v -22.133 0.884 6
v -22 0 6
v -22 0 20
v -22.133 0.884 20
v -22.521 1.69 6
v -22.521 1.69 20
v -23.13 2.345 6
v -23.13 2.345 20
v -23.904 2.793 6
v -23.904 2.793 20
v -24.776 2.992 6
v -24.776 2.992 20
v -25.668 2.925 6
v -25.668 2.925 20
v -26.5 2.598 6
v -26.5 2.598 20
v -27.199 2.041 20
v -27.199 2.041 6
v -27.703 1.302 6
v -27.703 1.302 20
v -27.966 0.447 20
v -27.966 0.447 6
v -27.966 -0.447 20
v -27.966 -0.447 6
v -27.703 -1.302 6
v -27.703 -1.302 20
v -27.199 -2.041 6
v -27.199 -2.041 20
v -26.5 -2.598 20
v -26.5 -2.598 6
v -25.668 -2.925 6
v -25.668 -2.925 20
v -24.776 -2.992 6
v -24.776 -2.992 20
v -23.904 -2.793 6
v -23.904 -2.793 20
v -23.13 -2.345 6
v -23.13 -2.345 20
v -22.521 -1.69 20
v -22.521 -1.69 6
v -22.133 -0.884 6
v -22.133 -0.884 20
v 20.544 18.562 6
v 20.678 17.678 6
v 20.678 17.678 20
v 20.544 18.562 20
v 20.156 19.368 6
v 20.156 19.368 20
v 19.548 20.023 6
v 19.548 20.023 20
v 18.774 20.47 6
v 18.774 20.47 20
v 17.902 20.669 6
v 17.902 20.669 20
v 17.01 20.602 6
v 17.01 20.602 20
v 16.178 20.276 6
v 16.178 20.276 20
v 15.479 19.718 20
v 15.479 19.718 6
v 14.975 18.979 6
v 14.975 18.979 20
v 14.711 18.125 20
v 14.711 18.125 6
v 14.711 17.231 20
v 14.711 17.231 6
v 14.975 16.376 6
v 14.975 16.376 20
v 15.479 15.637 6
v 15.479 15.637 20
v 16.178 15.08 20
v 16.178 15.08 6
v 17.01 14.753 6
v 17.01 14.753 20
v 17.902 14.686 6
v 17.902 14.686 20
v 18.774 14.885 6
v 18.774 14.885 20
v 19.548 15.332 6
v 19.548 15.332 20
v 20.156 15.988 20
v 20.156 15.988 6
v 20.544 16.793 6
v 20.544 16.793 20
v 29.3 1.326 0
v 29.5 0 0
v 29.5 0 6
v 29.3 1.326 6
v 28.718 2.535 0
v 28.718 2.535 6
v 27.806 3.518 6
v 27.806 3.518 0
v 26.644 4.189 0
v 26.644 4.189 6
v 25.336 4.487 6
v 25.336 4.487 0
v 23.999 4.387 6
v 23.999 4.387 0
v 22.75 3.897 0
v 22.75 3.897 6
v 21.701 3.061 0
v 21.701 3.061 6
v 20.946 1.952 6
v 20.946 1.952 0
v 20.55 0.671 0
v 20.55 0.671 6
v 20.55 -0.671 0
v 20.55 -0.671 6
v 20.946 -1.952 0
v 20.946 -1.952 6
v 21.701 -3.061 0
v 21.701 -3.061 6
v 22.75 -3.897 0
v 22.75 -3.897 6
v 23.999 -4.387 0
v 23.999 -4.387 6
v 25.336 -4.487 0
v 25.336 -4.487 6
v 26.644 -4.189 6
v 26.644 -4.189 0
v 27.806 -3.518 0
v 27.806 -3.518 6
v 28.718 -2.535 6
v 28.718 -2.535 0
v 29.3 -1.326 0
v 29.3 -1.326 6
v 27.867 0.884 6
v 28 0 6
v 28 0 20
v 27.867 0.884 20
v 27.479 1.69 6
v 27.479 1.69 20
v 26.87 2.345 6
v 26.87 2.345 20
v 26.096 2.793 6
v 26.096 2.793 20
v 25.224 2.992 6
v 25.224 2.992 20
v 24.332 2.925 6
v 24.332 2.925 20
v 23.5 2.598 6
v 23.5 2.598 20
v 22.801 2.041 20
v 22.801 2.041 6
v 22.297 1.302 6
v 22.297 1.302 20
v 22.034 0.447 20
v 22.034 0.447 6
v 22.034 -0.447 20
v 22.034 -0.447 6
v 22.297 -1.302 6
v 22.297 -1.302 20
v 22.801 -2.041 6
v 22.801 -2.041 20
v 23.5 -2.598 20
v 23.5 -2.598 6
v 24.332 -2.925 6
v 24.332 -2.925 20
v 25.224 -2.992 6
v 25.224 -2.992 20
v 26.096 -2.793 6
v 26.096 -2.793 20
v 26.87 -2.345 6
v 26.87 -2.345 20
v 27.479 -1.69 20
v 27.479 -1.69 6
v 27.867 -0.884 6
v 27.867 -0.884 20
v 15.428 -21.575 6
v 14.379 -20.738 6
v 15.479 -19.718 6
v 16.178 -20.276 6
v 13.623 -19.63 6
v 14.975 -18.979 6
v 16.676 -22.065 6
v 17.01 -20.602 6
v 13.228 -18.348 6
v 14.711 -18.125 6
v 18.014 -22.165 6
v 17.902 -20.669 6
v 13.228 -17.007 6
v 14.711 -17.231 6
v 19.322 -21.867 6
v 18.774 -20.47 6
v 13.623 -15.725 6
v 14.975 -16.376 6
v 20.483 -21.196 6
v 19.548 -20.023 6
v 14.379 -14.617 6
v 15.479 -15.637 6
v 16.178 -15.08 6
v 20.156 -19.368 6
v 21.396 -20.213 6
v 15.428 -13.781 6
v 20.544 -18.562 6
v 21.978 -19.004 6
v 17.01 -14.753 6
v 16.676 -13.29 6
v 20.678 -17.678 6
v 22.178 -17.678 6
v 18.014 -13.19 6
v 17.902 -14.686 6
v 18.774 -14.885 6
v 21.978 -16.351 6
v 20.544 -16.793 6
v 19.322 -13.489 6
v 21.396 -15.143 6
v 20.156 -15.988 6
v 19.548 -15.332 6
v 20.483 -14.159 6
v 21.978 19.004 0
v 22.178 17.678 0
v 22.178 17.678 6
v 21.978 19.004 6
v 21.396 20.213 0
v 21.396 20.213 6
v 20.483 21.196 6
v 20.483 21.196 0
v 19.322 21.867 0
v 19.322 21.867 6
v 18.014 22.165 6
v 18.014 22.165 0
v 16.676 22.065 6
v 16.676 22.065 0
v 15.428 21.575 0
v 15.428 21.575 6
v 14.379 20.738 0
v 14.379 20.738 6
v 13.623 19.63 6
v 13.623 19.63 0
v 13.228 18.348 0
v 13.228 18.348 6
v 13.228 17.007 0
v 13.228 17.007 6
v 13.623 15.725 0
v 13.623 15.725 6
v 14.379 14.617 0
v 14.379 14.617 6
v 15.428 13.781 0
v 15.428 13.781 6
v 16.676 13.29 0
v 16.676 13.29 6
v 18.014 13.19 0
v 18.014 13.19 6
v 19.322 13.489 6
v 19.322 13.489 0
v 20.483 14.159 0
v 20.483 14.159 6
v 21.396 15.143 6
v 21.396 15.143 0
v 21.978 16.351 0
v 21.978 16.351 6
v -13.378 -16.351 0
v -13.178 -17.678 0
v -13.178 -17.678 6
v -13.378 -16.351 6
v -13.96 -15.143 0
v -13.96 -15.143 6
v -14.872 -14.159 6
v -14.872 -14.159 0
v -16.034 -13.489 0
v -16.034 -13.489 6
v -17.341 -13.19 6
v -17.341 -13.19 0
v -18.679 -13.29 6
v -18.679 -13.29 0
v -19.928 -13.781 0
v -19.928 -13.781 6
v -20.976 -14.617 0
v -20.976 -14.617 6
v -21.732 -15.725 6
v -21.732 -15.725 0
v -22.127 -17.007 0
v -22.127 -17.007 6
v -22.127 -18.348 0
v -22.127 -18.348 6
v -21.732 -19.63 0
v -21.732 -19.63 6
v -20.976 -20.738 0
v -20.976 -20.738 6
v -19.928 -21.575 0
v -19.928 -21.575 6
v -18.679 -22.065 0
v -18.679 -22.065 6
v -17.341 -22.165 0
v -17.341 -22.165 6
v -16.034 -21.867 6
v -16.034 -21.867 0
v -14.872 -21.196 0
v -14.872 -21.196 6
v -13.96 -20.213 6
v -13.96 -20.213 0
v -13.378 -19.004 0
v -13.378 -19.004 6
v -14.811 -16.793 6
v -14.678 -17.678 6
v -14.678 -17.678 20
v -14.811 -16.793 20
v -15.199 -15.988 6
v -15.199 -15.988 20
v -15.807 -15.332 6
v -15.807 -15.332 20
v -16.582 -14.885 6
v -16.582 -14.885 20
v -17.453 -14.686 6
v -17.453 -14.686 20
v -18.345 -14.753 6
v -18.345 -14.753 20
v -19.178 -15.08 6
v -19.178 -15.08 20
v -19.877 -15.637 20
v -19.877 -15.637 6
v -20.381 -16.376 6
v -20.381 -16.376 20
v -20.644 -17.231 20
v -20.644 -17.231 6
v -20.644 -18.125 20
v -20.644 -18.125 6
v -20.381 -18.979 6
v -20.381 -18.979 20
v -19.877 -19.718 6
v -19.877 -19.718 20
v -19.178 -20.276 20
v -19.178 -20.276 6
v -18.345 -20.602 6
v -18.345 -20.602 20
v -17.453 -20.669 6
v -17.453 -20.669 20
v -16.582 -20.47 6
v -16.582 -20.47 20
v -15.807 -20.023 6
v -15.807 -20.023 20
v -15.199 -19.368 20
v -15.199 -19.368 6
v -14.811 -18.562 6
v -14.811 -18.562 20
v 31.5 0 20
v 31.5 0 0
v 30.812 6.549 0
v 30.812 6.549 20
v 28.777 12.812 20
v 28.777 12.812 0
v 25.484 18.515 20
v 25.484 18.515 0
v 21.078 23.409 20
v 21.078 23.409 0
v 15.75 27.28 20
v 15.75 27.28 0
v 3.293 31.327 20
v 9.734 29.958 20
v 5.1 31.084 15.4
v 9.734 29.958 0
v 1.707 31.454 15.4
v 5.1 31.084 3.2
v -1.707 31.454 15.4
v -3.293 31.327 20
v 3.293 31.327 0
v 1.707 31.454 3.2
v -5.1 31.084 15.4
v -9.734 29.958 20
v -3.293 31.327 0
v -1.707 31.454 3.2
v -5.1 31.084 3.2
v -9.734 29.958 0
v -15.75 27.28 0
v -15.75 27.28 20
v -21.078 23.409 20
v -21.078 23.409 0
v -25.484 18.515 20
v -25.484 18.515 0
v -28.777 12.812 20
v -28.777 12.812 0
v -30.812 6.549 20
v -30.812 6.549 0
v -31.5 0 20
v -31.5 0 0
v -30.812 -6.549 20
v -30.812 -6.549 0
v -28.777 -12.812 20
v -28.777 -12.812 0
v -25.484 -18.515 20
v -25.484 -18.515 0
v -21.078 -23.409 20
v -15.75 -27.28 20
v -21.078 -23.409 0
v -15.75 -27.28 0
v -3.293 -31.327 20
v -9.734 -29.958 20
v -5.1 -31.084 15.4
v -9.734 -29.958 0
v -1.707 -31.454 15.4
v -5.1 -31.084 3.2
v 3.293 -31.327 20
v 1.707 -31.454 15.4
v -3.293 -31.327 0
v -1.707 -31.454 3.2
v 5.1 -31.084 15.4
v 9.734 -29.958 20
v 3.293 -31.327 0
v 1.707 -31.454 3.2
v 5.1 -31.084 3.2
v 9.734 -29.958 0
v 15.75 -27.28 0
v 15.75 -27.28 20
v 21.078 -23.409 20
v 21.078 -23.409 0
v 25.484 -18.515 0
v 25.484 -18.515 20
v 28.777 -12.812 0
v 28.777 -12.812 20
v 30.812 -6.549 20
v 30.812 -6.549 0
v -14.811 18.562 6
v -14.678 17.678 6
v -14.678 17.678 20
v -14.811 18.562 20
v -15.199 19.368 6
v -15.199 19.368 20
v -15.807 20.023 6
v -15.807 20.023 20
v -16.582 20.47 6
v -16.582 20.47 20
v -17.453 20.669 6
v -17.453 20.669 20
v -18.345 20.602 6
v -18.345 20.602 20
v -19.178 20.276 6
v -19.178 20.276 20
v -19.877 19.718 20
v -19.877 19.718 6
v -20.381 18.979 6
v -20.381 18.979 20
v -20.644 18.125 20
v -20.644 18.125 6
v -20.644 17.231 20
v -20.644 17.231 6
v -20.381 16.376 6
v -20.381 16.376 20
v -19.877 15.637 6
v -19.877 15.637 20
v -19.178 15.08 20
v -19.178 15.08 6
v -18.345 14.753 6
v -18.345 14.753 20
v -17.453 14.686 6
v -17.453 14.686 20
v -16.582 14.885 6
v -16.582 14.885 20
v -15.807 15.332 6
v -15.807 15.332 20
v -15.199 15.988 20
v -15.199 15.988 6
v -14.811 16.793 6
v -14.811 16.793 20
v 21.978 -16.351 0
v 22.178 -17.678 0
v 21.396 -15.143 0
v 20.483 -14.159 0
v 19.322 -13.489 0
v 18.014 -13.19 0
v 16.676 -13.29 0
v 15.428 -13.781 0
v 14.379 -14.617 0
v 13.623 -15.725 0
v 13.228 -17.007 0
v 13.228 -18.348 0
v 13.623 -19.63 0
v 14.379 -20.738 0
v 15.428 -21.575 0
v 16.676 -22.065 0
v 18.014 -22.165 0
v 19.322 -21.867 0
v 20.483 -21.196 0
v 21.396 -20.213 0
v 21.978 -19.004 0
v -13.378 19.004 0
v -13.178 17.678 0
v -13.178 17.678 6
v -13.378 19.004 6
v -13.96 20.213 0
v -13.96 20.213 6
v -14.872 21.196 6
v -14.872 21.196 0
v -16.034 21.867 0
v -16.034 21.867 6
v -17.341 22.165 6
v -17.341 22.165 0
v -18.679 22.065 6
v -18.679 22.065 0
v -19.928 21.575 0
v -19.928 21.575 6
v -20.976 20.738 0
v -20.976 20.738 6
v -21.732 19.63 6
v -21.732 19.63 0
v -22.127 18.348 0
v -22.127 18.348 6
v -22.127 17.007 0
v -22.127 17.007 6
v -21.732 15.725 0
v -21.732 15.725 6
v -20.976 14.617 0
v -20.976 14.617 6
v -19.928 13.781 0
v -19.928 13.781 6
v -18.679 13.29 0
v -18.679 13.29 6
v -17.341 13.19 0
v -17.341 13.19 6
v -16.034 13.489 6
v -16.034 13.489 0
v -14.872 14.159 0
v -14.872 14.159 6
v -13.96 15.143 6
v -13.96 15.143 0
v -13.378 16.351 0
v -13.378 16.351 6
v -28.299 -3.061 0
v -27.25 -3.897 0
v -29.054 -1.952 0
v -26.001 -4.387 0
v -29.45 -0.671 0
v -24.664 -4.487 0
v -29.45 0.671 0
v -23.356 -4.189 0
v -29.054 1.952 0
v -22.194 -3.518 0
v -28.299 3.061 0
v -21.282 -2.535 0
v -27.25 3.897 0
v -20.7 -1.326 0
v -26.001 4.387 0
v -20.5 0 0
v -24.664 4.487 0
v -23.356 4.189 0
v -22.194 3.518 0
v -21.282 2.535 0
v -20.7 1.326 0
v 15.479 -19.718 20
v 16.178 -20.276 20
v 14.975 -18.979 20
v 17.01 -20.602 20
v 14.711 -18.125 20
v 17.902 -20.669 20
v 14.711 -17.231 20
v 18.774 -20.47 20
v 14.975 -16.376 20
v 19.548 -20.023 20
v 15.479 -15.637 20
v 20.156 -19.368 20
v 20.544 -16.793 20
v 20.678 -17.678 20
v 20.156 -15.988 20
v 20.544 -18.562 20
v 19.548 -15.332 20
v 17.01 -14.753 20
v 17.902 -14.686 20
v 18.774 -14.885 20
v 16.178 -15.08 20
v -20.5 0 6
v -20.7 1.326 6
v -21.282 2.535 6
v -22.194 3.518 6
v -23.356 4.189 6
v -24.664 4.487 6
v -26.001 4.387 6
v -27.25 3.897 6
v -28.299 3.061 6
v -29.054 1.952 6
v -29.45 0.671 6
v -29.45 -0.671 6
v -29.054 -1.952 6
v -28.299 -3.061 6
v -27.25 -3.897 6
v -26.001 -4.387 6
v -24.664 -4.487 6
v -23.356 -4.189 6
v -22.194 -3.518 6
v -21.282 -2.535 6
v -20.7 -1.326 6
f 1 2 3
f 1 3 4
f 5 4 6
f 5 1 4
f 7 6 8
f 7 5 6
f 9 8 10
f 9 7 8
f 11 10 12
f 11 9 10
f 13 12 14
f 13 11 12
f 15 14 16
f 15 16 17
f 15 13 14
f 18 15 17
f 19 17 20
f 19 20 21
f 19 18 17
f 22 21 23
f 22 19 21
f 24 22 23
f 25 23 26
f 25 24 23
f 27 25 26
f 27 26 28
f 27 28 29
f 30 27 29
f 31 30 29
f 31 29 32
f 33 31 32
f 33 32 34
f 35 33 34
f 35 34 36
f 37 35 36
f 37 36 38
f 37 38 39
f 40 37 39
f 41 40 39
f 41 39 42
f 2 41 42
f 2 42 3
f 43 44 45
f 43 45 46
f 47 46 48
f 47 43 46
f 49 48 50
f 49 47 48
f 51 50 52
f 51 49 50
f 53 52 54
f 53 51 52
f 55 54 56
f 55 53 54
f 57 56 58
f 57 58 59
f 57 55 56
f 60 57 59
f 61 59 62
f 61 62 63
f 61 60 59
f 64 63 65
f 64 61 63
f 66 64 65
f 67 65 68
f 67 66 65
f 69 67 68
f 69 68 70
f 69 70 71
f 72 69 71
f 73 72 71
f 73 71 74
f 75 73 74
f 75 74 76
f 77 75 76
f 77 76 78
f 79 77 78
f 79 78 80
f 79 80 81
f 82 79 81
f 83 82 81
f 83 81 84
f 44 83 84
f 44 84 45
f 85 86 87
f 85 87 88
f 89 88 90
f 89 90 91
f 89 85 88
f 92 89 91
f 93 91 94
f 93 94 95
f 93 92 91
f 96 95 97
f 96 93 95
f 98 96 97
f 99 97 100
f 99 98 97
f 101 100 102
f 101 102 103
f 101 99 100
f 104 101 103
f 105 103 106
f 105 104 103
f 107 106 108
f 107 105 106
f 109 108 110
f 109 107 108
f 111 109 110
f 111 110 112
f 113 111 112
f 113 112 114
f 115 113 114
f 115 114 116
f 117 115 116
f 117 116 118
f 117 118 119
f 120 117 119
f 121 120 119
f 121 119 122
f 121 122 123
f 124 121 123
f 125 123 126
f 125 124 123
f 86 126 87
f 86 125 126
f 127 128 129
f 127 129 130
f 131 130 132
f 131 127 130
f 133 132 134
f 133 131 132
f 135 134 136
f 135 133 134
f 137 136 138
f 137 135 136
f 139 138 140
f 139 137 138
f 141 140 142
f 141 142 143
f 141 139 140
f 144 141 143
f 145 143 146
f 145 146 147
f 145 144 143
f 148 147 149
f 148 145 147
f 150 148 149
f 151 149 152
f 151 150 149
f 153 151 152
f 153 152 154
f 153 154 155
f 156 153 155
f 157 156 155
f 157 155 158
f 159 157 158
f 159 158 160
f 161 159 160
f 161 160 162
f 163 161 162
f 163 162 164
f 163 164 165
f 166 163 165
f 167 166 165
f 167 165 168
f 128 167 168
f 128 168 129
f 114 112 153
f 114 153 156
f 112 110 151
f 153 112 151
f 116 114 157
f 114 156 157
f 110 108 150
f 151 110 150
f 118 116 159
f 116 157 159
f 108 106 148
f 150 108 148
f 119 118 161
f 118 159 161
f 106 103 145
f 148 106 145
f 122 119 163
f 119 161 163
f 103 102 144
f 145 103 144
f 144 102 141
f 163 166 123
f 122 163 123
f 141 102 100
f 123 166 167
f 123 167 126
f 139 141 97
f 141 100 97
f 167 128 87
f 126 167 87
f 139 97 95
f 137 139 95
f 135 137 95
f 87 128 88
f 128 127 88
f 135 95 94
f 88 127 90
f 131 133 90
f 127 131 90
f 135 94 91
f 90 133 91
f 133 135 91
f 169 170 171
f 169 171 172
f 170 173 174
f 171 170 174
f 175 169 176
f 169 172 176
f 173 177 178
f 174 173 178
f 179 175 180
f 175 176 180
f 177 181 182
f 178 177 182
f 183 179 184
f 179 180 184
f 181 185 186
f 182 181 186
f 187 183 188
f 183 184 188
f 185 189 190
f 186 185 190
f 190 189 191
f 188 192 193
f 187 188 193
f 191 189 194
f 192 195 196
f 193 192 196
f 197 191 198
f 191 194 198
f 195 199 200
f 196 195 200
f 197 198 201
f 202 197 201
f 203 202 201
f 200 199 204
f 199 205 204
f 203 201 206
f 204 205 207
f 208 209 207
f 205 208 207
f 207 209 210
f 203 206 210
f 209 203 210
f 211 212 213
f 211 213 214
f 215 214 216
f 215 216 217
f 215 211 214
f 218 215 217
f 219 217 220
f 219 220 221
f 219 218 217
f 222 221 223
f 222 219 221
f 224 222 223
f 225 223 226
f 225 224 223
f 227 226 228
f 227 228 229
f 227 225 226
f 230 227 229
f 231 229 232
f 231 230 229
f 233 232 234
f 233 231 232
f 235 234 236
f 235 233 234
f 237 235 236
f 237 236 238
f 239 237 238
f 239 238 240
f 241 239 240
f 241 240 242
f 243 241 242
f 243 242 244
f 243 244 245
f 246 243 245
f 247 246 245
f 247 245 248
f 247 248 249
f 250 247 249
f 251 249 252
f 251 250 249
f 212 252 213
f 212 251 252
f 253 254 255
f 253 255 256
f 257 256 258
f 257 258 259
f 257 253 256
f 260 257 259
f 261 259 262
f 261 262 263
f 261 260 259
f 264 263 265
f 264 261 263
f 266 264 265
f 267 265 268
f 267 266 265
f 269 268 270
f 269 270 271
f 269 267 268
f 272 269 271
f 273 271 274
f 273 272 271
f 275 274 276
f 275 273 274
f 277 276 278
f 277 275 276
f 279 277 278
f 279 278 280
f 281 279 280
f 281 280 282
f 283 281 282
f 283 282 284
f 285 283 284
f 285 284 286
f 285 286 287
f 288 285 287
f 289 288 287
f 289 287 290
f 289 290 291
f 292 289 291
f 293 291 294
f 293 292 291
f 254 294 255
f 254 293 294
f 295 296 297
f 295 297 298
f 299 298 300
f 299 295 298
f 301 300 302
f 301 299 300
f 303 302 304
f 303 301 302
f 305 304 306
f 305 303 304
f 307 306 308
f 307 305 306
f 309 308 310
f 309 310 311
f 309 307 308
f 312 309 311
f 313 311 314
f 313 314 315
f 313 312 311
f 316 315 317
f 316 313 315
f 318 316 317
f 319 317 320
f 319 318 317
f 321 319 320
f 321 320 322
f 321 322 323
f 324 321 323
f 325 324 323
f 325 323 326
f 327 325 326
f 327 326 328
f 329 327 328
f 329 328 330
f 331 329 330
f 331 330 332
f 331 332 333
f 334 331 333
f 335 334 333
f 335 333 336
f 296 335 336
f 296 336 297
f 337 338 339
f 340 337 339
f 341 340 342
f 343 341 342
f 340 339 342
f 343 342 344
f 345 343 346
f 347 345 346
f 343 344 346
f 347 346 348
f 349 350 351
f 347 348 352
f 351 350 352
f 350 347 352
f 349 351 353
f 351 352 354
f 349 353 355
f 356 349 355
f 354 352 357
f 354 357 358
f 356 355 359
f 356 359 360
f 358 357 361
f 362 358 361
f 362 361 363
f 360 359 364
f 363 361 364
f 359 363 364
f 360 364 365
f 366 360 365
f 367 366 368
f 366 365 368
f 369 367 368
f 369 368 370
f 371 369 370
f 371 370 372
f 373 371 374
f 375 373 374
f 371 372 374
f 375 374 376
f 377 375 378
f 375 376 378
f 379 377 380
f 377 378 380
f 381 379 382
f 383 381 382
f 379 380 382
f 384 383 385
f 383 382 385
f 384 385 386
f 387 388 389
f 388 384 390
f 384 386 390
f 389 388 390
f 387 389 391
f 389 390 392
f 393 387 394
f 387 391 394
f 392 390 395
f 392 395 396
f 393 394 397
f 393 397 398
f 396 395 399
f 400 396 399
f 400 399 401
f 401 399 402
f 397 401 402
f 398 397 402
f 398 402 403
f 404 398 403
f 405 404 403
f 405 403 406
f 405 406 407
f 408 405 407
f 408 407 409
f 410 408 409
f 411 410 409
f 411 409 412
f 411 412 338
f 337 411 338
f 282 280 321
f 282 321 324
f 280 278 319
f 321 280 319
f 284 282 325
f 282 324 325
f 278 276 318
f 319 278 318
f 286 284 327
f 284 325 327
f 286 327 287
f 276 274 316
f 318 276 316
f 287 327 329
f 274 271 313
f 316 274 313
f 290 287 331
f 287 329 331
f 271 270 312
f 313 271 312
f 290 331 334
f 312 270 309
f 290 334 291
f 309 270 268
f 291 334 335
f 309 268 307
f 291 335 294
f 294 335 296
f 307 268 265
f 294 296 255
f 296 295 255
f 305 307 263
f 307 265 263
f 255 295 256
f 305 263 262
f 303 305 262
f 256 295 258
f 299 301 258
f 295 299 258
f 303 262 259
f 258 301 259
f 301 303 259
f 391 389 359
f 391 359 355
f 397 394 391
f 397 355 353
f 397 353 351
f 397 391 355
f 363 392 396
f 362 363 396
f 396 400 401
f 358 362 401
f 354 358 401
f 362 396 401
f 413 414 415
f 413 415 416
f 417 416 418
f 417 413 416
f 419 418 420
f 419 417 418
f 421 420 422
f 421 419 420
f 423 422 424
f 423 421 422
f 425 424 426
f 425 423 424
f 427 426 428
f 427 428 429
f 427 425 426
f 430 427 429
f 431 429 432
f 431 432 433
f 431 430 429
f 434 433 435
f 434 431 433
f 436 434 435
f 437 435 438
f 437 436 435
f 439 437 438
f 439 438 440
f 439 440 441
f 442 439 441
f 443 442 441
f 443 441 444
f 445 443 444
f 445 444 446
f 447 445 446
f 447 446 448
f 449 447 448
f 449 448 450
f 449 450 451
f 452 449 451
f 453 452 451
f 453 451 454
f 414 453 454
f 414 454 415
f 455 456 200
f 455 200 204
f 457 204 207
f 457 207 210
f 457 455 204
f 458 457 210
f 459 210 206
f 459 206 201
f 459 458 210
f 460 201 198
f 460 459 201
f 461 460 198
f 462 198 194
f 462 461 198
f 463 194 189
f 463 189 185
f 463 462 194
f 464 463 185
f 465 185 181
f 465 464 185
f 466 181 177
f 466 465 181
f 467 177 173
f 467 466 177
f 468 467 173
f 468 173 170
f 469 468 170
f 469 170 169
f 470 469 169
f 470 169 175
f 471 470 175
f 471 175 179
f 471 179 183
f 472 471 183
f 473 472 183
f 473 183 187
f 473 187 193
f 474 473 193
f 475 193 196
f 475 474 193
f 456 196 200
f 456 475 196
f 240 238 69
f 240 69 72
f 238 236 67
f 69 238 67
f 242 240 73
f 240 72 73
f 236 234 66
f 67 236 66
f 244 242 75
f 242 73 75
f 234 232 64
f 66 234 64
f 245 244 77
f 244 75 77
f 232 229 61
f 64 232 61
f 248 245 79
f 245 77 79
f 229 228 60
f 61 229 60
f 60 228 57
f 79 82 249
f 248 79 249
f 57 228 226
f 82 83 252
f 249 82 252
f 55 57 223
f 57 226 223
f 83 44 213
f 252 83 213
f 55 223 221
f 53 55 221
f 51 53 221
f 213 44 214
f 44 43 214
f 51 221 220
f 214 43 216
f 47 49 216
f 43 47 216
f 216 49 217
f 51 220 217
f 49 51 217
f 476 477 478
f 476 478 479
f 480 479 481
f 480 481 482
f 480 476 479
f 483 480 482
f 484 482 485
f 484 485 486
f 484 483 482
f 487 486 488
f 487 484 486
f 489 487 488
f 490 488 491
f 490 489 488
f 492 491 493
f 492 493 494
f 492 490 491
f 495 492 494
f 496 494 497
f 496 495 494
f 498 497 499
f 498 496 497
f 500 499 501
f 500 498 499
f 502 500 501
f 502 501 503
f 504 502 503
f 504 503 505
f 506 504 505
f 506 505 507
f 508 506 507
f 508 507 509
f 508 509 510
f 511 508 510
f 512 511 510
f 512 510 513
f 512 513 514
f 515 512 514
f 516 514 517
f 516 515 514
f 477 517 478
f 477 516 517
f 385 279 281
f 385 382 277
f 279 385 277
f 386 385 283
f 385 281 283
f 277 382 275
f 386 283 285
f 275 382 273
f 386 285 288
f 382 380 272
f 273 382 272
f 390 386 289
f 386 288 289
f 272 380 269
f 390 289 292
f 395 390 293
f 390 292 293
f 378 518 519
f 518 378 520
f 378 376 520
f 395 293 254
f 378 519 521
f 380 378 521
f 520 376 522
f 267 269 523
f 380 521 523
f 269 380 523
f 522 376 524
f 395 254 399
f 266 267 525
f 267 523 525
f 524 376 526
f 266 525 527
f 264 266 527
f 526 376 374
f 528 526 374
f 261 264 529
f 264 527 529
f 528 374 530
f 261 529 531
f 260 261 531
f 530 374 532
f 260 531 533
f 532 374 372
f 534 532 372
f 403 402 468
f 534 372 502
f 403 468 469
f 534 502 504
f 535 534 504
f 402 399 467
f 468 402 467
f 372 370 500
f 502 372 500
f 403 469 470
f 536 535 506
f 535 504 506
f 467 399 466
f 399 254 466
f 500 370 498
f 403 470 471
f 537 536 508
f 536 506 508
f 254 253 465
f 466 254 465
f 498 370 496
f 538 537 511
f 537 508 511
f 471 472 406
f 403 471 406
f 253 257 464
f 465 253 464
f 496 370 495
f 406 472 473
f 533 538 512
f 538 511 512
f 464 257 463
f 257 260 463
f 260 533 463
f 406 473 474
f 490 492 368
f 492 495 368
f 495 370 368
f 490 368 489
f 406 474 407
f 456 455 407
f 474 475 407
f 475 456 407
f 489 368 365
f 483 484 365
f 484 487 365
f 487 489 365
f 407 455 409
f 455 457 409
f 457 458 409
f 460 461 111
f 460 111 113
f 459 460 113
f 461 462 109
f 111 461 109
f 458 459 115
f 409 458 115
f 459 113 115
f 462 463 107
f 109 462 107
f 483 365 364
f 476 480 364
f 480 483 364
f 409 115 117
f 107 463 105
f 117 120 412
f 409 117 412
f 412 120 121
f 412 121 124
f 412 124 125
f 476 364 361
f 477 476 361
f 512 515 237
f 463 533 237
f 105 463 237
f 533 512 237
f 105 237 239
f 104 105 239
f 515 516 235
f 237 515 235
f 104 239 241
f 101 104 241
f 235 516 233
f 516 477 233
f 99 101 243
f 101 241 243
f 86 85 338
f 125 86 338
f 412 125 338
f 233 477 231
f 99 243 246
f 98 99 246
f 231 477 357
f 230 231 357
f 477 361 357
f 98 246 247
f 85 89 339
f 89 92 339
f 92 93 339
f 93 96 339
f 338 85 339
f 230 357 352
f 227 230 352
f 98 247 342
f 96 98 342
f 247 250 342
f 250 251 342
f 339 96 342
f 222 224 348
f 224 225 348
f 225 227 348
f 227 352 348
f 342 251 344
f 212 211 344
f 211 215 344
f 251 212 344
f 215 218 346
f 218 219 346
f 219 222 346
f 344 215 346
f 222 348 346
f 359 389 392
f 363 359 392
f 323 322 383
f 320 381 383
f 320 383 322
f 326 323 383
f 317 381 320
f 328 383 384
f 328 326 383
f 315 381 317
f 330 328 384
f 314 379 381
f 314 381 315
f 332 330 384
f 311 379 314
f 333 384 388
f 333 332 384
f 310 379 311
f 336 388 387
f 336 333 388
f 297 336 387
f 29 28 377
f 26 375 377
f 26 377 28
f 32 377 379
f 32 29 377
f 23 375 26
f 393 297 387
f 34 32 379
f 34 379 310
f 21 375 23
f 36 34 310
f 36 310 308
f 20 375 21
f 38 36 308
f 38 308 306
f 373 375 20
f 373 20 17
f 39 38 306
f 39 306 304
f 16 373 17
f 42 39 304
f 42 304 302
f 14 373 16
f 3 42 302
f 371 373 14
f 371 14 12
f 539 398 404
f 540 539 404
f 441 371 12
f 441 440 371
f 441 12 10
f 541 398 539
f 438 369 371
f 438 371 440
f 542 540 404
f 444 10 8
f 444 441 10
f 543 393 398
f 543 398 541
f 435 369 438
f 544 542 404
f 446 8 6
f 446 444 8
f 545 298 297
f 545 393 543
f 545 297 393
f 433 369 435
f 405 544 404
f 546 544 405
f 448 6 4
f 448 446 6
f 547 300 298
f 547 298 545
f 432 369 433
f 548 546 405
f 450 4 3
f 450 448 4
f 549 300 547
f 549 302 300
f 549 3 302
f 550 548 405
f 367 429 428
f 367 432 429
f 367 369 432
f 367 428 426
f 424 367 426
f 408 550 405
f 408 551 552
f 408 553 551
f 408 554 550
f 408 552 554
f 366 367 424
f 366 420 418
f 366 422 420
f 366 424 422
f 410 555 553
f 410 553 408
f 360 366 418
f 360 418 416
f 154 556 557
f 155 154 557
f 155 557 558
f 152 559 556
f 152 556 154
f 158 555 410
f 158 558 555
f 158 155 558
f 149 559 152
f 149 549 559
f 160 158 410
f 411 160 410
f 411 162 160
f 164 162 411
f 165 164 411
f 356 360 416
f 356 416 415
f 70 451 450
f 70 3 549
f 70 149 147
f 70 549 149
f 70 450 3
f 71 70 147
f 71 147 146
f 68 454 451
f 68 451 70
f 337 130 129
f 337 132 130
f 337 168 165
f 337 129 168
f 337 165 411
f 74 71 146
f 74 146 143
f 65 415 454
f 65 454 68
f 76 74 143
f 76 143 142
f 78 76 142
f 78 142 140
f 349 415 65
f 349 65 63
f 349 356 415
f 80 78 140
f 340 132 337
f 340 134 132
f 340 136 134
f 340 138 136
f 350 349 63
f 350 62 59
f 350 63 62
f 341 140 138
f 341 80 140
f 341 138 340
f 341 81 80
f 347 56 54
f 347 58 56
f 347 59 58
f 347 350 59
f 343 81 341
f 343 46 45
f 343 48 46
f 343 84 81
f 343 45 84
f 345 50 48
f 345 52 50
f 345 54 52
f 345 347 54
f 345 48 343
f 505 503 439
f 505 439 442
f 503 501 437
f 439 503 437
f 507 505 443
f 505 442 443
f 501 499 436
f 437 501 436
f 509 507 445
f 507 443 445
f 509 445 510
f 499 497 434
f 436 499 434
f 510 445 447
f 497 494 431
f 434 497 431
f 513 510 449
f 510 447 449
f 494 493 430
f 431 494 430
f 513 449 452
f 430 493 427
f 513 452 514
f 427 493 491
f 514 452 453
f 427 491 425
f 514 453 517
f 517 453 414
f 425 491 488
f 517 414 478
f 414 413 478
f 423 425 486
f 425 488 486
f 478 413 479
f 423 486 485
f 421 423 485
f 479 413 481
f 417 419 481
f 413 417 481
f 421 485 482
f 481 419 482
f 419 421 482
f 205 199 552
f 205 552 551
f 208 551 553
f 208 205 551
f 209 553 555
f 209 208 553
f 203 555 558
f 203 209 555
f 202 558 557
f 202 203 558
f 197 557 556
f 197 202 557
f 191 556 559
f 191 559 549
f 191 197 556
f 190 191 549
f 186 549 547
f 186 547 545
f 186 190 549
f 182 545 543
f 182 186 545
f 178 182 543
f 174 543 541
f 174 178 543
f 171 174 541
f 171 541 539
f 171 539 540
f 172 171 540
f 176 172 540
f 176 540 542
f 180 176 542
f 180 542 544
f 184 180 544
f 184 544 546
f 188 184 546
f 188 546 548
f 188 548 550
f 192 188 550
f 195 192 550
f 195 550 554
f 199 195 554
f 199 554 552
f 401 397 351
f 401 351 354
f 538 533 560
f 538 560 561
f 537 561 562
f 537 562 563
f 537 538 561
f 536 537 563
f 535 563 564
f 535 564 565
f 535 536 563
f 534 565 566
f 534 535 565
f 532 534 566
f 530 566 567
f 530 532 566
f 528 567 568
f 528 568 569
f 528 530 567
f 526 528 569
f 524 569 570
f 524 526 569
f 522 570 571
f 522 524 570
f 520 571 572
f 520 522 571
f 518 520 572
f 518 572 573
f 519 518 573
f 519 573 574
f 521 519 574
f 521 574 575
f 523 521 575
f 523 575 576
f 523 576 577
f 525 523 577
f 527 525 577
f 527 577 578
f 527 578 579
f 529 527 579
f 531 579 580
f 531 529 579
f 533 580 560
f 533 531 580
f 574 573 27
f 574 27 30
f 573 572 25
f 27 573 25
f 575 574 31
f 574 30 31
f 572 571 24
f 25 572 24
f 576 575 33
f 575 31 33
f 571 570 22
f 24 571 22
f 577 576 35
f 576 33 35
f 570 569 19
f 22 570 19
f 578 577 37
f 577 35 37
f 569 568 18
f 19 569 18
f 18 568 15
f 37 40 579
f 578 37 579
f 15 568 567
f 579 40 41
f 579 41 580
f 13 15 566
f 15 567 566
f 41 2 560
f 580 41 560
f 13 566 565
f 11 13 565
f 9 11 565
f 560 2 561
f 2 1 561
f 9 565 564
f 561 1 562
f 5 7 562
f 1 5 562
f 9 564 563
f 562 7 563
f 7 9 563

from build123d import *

# Parameters (mm, degrees)
SKETCH2_R               = 31.5
SKETCH2_R_2             = 4.5
BOSS_EXTRUDE2_DEPTH     = 20
CUT_EXTRUDE1_DEPTH      = 26
CUT_EXTRUDE1_DEPTH_BACK = 80
SKETCH3_W               = 10.2
SKETCH3_H               = 12.2
SKETCH2_4_R             = 4.5
BOSS_EXTRUDE3_DEPTH     = 20
SKETCH2_5_R             = 4.5
CUT_EXTRUDE2_DEPTH      = 6
SKETCH2_6_R             = 3
CUT_EXTRUDE3_DEPTH      = 20


with BuildPart() as part:
    # Sketch2 → Boss-Extrude2 (new body)
    with BuildSketch(Plane.XY):
        Circle(SKETCH2_R)
        with Locations((-17.67766953, 17.67766953)):
            Circle(SKETCH2_R_2, mode=Mode.SUBTRACT)
        with Locations((-25, 0)):
            Circle(SKETCH2_R_2, mode=Mode.SUBTRACT)
        with Locations((-17.67766953, -17.67766953)):
            Circle(SKETCH2_R_2, mode=Mode.SUBTRACT)
        with Locations((17.67766953, 17.67766953)):
            Circle(SKETCH2_R_2, mode=Mode.SUBTRACT)
        with Locations((25, 0)):
            Circle(SKETCH2_R_2, mode=Mode.SUBTRACT)
        with Locations((17.67766953, -17.67766953)):
            Circle(SKETCH2_R_2, mode=Mode.SUBTRACT)
    extrude(amount=BOSS_EXTRUDE2_DEPTH)

    # Sketch3 → Cut-Extrude1 (cut, two sides: drawn at the far end of the back side and taken through both)
    with BuildSketch(Plane(origin=(0, 32.253829663, 0), x_dir=(1, 0, 0), z_dir=(0, 1, 0)).offset(-CUT_EXTRUDE1_DEPTH_BACK)):
        with Locations((0, -9.3)):
            Rectangle(SKETCH3_W, SKETCH3_H)
    extrude(amount=CUT_EXTRUDE1_DEPTH + CUT_EXTRUDE1_DEPTH_BACK, mode=Mode.SUBTRACT)

    # Sketch2<4> → Boss-Extrude3 (add)
    with BuildSketch(Plane.XY):
        with Locations((-17.67766953, 17.67766953)):
            Circle(SKETCH2_4_R)
        with Locations((-25, 0)):
            Circle(SKETCH2_4_R)
        with Locations((-17.67766953, -17.67766953)):
            Circle(SKETCH2_4_R)
        with Locations((17.67766953, 17.67766953)):
            Circle(SKETCH2_4_R)
        with Locations((25, 0)):
            Circle(SKETCH2_4_R)
        with Locations((17.67766953, -17.67766953)):
            Circle(SKETCH2_4_R)
    extrude(amount=BOSS_EXTRUDE3_DEPTH)

    # Sketch2<5> → Cut-Extrude2 (cut)
    with BuildSketch(Plane.XY):
        with Locations((-17.67766953, 17.67766953)):
            Circle(SKETCH2_5_R)
        with Locations((-25, 0)):
            Circle(SKETCH2_5_R)
        with Locations((-17.67766953, -17.67766953)):
            Circle(SKETCH2_5_R)
        with Locations((17.67766953, 17.67766953)):
            Circle(SKETCH2_5_R)
        with Locations((25, 0)):
            Circle(SKETCH2_5_R)
        with Locations((17.67766953, -17.67766953)):
            Circle(SKETCH2_5_R)
    extrude(amount=CUT_EXTRUDE2_DEPTH, mode=Mode.SUBTRACT)

    # Sketch2<6> → Cut-Extrude3 (cut)
    with BuildSketch(Plane.XY):
        with Locations((-17.67766953, 17.67766953)):
            Circle(SKETCH2_6_R)
        with Locations((-25, 0)):
            Circle(SKETCH2_6_R)
        with Locations((-17.67766953, -17.67766953)):
            Circle(SKETCH2_6_R)
        with Locations((17.67766953, 17.67766953)):
            Circle(SKETCH2_6_R)
        with Locations((25, 0)):
            Circle(SKETCH2_6_R)
        with Locations((17.67766953, -17.67766953)):
            Circle(SKETCH2_6_R)
    extrude(amount=CUT_EXTRUDE3_DEPTH, mode=Mode.SUBTRACT)


solid = part.part
